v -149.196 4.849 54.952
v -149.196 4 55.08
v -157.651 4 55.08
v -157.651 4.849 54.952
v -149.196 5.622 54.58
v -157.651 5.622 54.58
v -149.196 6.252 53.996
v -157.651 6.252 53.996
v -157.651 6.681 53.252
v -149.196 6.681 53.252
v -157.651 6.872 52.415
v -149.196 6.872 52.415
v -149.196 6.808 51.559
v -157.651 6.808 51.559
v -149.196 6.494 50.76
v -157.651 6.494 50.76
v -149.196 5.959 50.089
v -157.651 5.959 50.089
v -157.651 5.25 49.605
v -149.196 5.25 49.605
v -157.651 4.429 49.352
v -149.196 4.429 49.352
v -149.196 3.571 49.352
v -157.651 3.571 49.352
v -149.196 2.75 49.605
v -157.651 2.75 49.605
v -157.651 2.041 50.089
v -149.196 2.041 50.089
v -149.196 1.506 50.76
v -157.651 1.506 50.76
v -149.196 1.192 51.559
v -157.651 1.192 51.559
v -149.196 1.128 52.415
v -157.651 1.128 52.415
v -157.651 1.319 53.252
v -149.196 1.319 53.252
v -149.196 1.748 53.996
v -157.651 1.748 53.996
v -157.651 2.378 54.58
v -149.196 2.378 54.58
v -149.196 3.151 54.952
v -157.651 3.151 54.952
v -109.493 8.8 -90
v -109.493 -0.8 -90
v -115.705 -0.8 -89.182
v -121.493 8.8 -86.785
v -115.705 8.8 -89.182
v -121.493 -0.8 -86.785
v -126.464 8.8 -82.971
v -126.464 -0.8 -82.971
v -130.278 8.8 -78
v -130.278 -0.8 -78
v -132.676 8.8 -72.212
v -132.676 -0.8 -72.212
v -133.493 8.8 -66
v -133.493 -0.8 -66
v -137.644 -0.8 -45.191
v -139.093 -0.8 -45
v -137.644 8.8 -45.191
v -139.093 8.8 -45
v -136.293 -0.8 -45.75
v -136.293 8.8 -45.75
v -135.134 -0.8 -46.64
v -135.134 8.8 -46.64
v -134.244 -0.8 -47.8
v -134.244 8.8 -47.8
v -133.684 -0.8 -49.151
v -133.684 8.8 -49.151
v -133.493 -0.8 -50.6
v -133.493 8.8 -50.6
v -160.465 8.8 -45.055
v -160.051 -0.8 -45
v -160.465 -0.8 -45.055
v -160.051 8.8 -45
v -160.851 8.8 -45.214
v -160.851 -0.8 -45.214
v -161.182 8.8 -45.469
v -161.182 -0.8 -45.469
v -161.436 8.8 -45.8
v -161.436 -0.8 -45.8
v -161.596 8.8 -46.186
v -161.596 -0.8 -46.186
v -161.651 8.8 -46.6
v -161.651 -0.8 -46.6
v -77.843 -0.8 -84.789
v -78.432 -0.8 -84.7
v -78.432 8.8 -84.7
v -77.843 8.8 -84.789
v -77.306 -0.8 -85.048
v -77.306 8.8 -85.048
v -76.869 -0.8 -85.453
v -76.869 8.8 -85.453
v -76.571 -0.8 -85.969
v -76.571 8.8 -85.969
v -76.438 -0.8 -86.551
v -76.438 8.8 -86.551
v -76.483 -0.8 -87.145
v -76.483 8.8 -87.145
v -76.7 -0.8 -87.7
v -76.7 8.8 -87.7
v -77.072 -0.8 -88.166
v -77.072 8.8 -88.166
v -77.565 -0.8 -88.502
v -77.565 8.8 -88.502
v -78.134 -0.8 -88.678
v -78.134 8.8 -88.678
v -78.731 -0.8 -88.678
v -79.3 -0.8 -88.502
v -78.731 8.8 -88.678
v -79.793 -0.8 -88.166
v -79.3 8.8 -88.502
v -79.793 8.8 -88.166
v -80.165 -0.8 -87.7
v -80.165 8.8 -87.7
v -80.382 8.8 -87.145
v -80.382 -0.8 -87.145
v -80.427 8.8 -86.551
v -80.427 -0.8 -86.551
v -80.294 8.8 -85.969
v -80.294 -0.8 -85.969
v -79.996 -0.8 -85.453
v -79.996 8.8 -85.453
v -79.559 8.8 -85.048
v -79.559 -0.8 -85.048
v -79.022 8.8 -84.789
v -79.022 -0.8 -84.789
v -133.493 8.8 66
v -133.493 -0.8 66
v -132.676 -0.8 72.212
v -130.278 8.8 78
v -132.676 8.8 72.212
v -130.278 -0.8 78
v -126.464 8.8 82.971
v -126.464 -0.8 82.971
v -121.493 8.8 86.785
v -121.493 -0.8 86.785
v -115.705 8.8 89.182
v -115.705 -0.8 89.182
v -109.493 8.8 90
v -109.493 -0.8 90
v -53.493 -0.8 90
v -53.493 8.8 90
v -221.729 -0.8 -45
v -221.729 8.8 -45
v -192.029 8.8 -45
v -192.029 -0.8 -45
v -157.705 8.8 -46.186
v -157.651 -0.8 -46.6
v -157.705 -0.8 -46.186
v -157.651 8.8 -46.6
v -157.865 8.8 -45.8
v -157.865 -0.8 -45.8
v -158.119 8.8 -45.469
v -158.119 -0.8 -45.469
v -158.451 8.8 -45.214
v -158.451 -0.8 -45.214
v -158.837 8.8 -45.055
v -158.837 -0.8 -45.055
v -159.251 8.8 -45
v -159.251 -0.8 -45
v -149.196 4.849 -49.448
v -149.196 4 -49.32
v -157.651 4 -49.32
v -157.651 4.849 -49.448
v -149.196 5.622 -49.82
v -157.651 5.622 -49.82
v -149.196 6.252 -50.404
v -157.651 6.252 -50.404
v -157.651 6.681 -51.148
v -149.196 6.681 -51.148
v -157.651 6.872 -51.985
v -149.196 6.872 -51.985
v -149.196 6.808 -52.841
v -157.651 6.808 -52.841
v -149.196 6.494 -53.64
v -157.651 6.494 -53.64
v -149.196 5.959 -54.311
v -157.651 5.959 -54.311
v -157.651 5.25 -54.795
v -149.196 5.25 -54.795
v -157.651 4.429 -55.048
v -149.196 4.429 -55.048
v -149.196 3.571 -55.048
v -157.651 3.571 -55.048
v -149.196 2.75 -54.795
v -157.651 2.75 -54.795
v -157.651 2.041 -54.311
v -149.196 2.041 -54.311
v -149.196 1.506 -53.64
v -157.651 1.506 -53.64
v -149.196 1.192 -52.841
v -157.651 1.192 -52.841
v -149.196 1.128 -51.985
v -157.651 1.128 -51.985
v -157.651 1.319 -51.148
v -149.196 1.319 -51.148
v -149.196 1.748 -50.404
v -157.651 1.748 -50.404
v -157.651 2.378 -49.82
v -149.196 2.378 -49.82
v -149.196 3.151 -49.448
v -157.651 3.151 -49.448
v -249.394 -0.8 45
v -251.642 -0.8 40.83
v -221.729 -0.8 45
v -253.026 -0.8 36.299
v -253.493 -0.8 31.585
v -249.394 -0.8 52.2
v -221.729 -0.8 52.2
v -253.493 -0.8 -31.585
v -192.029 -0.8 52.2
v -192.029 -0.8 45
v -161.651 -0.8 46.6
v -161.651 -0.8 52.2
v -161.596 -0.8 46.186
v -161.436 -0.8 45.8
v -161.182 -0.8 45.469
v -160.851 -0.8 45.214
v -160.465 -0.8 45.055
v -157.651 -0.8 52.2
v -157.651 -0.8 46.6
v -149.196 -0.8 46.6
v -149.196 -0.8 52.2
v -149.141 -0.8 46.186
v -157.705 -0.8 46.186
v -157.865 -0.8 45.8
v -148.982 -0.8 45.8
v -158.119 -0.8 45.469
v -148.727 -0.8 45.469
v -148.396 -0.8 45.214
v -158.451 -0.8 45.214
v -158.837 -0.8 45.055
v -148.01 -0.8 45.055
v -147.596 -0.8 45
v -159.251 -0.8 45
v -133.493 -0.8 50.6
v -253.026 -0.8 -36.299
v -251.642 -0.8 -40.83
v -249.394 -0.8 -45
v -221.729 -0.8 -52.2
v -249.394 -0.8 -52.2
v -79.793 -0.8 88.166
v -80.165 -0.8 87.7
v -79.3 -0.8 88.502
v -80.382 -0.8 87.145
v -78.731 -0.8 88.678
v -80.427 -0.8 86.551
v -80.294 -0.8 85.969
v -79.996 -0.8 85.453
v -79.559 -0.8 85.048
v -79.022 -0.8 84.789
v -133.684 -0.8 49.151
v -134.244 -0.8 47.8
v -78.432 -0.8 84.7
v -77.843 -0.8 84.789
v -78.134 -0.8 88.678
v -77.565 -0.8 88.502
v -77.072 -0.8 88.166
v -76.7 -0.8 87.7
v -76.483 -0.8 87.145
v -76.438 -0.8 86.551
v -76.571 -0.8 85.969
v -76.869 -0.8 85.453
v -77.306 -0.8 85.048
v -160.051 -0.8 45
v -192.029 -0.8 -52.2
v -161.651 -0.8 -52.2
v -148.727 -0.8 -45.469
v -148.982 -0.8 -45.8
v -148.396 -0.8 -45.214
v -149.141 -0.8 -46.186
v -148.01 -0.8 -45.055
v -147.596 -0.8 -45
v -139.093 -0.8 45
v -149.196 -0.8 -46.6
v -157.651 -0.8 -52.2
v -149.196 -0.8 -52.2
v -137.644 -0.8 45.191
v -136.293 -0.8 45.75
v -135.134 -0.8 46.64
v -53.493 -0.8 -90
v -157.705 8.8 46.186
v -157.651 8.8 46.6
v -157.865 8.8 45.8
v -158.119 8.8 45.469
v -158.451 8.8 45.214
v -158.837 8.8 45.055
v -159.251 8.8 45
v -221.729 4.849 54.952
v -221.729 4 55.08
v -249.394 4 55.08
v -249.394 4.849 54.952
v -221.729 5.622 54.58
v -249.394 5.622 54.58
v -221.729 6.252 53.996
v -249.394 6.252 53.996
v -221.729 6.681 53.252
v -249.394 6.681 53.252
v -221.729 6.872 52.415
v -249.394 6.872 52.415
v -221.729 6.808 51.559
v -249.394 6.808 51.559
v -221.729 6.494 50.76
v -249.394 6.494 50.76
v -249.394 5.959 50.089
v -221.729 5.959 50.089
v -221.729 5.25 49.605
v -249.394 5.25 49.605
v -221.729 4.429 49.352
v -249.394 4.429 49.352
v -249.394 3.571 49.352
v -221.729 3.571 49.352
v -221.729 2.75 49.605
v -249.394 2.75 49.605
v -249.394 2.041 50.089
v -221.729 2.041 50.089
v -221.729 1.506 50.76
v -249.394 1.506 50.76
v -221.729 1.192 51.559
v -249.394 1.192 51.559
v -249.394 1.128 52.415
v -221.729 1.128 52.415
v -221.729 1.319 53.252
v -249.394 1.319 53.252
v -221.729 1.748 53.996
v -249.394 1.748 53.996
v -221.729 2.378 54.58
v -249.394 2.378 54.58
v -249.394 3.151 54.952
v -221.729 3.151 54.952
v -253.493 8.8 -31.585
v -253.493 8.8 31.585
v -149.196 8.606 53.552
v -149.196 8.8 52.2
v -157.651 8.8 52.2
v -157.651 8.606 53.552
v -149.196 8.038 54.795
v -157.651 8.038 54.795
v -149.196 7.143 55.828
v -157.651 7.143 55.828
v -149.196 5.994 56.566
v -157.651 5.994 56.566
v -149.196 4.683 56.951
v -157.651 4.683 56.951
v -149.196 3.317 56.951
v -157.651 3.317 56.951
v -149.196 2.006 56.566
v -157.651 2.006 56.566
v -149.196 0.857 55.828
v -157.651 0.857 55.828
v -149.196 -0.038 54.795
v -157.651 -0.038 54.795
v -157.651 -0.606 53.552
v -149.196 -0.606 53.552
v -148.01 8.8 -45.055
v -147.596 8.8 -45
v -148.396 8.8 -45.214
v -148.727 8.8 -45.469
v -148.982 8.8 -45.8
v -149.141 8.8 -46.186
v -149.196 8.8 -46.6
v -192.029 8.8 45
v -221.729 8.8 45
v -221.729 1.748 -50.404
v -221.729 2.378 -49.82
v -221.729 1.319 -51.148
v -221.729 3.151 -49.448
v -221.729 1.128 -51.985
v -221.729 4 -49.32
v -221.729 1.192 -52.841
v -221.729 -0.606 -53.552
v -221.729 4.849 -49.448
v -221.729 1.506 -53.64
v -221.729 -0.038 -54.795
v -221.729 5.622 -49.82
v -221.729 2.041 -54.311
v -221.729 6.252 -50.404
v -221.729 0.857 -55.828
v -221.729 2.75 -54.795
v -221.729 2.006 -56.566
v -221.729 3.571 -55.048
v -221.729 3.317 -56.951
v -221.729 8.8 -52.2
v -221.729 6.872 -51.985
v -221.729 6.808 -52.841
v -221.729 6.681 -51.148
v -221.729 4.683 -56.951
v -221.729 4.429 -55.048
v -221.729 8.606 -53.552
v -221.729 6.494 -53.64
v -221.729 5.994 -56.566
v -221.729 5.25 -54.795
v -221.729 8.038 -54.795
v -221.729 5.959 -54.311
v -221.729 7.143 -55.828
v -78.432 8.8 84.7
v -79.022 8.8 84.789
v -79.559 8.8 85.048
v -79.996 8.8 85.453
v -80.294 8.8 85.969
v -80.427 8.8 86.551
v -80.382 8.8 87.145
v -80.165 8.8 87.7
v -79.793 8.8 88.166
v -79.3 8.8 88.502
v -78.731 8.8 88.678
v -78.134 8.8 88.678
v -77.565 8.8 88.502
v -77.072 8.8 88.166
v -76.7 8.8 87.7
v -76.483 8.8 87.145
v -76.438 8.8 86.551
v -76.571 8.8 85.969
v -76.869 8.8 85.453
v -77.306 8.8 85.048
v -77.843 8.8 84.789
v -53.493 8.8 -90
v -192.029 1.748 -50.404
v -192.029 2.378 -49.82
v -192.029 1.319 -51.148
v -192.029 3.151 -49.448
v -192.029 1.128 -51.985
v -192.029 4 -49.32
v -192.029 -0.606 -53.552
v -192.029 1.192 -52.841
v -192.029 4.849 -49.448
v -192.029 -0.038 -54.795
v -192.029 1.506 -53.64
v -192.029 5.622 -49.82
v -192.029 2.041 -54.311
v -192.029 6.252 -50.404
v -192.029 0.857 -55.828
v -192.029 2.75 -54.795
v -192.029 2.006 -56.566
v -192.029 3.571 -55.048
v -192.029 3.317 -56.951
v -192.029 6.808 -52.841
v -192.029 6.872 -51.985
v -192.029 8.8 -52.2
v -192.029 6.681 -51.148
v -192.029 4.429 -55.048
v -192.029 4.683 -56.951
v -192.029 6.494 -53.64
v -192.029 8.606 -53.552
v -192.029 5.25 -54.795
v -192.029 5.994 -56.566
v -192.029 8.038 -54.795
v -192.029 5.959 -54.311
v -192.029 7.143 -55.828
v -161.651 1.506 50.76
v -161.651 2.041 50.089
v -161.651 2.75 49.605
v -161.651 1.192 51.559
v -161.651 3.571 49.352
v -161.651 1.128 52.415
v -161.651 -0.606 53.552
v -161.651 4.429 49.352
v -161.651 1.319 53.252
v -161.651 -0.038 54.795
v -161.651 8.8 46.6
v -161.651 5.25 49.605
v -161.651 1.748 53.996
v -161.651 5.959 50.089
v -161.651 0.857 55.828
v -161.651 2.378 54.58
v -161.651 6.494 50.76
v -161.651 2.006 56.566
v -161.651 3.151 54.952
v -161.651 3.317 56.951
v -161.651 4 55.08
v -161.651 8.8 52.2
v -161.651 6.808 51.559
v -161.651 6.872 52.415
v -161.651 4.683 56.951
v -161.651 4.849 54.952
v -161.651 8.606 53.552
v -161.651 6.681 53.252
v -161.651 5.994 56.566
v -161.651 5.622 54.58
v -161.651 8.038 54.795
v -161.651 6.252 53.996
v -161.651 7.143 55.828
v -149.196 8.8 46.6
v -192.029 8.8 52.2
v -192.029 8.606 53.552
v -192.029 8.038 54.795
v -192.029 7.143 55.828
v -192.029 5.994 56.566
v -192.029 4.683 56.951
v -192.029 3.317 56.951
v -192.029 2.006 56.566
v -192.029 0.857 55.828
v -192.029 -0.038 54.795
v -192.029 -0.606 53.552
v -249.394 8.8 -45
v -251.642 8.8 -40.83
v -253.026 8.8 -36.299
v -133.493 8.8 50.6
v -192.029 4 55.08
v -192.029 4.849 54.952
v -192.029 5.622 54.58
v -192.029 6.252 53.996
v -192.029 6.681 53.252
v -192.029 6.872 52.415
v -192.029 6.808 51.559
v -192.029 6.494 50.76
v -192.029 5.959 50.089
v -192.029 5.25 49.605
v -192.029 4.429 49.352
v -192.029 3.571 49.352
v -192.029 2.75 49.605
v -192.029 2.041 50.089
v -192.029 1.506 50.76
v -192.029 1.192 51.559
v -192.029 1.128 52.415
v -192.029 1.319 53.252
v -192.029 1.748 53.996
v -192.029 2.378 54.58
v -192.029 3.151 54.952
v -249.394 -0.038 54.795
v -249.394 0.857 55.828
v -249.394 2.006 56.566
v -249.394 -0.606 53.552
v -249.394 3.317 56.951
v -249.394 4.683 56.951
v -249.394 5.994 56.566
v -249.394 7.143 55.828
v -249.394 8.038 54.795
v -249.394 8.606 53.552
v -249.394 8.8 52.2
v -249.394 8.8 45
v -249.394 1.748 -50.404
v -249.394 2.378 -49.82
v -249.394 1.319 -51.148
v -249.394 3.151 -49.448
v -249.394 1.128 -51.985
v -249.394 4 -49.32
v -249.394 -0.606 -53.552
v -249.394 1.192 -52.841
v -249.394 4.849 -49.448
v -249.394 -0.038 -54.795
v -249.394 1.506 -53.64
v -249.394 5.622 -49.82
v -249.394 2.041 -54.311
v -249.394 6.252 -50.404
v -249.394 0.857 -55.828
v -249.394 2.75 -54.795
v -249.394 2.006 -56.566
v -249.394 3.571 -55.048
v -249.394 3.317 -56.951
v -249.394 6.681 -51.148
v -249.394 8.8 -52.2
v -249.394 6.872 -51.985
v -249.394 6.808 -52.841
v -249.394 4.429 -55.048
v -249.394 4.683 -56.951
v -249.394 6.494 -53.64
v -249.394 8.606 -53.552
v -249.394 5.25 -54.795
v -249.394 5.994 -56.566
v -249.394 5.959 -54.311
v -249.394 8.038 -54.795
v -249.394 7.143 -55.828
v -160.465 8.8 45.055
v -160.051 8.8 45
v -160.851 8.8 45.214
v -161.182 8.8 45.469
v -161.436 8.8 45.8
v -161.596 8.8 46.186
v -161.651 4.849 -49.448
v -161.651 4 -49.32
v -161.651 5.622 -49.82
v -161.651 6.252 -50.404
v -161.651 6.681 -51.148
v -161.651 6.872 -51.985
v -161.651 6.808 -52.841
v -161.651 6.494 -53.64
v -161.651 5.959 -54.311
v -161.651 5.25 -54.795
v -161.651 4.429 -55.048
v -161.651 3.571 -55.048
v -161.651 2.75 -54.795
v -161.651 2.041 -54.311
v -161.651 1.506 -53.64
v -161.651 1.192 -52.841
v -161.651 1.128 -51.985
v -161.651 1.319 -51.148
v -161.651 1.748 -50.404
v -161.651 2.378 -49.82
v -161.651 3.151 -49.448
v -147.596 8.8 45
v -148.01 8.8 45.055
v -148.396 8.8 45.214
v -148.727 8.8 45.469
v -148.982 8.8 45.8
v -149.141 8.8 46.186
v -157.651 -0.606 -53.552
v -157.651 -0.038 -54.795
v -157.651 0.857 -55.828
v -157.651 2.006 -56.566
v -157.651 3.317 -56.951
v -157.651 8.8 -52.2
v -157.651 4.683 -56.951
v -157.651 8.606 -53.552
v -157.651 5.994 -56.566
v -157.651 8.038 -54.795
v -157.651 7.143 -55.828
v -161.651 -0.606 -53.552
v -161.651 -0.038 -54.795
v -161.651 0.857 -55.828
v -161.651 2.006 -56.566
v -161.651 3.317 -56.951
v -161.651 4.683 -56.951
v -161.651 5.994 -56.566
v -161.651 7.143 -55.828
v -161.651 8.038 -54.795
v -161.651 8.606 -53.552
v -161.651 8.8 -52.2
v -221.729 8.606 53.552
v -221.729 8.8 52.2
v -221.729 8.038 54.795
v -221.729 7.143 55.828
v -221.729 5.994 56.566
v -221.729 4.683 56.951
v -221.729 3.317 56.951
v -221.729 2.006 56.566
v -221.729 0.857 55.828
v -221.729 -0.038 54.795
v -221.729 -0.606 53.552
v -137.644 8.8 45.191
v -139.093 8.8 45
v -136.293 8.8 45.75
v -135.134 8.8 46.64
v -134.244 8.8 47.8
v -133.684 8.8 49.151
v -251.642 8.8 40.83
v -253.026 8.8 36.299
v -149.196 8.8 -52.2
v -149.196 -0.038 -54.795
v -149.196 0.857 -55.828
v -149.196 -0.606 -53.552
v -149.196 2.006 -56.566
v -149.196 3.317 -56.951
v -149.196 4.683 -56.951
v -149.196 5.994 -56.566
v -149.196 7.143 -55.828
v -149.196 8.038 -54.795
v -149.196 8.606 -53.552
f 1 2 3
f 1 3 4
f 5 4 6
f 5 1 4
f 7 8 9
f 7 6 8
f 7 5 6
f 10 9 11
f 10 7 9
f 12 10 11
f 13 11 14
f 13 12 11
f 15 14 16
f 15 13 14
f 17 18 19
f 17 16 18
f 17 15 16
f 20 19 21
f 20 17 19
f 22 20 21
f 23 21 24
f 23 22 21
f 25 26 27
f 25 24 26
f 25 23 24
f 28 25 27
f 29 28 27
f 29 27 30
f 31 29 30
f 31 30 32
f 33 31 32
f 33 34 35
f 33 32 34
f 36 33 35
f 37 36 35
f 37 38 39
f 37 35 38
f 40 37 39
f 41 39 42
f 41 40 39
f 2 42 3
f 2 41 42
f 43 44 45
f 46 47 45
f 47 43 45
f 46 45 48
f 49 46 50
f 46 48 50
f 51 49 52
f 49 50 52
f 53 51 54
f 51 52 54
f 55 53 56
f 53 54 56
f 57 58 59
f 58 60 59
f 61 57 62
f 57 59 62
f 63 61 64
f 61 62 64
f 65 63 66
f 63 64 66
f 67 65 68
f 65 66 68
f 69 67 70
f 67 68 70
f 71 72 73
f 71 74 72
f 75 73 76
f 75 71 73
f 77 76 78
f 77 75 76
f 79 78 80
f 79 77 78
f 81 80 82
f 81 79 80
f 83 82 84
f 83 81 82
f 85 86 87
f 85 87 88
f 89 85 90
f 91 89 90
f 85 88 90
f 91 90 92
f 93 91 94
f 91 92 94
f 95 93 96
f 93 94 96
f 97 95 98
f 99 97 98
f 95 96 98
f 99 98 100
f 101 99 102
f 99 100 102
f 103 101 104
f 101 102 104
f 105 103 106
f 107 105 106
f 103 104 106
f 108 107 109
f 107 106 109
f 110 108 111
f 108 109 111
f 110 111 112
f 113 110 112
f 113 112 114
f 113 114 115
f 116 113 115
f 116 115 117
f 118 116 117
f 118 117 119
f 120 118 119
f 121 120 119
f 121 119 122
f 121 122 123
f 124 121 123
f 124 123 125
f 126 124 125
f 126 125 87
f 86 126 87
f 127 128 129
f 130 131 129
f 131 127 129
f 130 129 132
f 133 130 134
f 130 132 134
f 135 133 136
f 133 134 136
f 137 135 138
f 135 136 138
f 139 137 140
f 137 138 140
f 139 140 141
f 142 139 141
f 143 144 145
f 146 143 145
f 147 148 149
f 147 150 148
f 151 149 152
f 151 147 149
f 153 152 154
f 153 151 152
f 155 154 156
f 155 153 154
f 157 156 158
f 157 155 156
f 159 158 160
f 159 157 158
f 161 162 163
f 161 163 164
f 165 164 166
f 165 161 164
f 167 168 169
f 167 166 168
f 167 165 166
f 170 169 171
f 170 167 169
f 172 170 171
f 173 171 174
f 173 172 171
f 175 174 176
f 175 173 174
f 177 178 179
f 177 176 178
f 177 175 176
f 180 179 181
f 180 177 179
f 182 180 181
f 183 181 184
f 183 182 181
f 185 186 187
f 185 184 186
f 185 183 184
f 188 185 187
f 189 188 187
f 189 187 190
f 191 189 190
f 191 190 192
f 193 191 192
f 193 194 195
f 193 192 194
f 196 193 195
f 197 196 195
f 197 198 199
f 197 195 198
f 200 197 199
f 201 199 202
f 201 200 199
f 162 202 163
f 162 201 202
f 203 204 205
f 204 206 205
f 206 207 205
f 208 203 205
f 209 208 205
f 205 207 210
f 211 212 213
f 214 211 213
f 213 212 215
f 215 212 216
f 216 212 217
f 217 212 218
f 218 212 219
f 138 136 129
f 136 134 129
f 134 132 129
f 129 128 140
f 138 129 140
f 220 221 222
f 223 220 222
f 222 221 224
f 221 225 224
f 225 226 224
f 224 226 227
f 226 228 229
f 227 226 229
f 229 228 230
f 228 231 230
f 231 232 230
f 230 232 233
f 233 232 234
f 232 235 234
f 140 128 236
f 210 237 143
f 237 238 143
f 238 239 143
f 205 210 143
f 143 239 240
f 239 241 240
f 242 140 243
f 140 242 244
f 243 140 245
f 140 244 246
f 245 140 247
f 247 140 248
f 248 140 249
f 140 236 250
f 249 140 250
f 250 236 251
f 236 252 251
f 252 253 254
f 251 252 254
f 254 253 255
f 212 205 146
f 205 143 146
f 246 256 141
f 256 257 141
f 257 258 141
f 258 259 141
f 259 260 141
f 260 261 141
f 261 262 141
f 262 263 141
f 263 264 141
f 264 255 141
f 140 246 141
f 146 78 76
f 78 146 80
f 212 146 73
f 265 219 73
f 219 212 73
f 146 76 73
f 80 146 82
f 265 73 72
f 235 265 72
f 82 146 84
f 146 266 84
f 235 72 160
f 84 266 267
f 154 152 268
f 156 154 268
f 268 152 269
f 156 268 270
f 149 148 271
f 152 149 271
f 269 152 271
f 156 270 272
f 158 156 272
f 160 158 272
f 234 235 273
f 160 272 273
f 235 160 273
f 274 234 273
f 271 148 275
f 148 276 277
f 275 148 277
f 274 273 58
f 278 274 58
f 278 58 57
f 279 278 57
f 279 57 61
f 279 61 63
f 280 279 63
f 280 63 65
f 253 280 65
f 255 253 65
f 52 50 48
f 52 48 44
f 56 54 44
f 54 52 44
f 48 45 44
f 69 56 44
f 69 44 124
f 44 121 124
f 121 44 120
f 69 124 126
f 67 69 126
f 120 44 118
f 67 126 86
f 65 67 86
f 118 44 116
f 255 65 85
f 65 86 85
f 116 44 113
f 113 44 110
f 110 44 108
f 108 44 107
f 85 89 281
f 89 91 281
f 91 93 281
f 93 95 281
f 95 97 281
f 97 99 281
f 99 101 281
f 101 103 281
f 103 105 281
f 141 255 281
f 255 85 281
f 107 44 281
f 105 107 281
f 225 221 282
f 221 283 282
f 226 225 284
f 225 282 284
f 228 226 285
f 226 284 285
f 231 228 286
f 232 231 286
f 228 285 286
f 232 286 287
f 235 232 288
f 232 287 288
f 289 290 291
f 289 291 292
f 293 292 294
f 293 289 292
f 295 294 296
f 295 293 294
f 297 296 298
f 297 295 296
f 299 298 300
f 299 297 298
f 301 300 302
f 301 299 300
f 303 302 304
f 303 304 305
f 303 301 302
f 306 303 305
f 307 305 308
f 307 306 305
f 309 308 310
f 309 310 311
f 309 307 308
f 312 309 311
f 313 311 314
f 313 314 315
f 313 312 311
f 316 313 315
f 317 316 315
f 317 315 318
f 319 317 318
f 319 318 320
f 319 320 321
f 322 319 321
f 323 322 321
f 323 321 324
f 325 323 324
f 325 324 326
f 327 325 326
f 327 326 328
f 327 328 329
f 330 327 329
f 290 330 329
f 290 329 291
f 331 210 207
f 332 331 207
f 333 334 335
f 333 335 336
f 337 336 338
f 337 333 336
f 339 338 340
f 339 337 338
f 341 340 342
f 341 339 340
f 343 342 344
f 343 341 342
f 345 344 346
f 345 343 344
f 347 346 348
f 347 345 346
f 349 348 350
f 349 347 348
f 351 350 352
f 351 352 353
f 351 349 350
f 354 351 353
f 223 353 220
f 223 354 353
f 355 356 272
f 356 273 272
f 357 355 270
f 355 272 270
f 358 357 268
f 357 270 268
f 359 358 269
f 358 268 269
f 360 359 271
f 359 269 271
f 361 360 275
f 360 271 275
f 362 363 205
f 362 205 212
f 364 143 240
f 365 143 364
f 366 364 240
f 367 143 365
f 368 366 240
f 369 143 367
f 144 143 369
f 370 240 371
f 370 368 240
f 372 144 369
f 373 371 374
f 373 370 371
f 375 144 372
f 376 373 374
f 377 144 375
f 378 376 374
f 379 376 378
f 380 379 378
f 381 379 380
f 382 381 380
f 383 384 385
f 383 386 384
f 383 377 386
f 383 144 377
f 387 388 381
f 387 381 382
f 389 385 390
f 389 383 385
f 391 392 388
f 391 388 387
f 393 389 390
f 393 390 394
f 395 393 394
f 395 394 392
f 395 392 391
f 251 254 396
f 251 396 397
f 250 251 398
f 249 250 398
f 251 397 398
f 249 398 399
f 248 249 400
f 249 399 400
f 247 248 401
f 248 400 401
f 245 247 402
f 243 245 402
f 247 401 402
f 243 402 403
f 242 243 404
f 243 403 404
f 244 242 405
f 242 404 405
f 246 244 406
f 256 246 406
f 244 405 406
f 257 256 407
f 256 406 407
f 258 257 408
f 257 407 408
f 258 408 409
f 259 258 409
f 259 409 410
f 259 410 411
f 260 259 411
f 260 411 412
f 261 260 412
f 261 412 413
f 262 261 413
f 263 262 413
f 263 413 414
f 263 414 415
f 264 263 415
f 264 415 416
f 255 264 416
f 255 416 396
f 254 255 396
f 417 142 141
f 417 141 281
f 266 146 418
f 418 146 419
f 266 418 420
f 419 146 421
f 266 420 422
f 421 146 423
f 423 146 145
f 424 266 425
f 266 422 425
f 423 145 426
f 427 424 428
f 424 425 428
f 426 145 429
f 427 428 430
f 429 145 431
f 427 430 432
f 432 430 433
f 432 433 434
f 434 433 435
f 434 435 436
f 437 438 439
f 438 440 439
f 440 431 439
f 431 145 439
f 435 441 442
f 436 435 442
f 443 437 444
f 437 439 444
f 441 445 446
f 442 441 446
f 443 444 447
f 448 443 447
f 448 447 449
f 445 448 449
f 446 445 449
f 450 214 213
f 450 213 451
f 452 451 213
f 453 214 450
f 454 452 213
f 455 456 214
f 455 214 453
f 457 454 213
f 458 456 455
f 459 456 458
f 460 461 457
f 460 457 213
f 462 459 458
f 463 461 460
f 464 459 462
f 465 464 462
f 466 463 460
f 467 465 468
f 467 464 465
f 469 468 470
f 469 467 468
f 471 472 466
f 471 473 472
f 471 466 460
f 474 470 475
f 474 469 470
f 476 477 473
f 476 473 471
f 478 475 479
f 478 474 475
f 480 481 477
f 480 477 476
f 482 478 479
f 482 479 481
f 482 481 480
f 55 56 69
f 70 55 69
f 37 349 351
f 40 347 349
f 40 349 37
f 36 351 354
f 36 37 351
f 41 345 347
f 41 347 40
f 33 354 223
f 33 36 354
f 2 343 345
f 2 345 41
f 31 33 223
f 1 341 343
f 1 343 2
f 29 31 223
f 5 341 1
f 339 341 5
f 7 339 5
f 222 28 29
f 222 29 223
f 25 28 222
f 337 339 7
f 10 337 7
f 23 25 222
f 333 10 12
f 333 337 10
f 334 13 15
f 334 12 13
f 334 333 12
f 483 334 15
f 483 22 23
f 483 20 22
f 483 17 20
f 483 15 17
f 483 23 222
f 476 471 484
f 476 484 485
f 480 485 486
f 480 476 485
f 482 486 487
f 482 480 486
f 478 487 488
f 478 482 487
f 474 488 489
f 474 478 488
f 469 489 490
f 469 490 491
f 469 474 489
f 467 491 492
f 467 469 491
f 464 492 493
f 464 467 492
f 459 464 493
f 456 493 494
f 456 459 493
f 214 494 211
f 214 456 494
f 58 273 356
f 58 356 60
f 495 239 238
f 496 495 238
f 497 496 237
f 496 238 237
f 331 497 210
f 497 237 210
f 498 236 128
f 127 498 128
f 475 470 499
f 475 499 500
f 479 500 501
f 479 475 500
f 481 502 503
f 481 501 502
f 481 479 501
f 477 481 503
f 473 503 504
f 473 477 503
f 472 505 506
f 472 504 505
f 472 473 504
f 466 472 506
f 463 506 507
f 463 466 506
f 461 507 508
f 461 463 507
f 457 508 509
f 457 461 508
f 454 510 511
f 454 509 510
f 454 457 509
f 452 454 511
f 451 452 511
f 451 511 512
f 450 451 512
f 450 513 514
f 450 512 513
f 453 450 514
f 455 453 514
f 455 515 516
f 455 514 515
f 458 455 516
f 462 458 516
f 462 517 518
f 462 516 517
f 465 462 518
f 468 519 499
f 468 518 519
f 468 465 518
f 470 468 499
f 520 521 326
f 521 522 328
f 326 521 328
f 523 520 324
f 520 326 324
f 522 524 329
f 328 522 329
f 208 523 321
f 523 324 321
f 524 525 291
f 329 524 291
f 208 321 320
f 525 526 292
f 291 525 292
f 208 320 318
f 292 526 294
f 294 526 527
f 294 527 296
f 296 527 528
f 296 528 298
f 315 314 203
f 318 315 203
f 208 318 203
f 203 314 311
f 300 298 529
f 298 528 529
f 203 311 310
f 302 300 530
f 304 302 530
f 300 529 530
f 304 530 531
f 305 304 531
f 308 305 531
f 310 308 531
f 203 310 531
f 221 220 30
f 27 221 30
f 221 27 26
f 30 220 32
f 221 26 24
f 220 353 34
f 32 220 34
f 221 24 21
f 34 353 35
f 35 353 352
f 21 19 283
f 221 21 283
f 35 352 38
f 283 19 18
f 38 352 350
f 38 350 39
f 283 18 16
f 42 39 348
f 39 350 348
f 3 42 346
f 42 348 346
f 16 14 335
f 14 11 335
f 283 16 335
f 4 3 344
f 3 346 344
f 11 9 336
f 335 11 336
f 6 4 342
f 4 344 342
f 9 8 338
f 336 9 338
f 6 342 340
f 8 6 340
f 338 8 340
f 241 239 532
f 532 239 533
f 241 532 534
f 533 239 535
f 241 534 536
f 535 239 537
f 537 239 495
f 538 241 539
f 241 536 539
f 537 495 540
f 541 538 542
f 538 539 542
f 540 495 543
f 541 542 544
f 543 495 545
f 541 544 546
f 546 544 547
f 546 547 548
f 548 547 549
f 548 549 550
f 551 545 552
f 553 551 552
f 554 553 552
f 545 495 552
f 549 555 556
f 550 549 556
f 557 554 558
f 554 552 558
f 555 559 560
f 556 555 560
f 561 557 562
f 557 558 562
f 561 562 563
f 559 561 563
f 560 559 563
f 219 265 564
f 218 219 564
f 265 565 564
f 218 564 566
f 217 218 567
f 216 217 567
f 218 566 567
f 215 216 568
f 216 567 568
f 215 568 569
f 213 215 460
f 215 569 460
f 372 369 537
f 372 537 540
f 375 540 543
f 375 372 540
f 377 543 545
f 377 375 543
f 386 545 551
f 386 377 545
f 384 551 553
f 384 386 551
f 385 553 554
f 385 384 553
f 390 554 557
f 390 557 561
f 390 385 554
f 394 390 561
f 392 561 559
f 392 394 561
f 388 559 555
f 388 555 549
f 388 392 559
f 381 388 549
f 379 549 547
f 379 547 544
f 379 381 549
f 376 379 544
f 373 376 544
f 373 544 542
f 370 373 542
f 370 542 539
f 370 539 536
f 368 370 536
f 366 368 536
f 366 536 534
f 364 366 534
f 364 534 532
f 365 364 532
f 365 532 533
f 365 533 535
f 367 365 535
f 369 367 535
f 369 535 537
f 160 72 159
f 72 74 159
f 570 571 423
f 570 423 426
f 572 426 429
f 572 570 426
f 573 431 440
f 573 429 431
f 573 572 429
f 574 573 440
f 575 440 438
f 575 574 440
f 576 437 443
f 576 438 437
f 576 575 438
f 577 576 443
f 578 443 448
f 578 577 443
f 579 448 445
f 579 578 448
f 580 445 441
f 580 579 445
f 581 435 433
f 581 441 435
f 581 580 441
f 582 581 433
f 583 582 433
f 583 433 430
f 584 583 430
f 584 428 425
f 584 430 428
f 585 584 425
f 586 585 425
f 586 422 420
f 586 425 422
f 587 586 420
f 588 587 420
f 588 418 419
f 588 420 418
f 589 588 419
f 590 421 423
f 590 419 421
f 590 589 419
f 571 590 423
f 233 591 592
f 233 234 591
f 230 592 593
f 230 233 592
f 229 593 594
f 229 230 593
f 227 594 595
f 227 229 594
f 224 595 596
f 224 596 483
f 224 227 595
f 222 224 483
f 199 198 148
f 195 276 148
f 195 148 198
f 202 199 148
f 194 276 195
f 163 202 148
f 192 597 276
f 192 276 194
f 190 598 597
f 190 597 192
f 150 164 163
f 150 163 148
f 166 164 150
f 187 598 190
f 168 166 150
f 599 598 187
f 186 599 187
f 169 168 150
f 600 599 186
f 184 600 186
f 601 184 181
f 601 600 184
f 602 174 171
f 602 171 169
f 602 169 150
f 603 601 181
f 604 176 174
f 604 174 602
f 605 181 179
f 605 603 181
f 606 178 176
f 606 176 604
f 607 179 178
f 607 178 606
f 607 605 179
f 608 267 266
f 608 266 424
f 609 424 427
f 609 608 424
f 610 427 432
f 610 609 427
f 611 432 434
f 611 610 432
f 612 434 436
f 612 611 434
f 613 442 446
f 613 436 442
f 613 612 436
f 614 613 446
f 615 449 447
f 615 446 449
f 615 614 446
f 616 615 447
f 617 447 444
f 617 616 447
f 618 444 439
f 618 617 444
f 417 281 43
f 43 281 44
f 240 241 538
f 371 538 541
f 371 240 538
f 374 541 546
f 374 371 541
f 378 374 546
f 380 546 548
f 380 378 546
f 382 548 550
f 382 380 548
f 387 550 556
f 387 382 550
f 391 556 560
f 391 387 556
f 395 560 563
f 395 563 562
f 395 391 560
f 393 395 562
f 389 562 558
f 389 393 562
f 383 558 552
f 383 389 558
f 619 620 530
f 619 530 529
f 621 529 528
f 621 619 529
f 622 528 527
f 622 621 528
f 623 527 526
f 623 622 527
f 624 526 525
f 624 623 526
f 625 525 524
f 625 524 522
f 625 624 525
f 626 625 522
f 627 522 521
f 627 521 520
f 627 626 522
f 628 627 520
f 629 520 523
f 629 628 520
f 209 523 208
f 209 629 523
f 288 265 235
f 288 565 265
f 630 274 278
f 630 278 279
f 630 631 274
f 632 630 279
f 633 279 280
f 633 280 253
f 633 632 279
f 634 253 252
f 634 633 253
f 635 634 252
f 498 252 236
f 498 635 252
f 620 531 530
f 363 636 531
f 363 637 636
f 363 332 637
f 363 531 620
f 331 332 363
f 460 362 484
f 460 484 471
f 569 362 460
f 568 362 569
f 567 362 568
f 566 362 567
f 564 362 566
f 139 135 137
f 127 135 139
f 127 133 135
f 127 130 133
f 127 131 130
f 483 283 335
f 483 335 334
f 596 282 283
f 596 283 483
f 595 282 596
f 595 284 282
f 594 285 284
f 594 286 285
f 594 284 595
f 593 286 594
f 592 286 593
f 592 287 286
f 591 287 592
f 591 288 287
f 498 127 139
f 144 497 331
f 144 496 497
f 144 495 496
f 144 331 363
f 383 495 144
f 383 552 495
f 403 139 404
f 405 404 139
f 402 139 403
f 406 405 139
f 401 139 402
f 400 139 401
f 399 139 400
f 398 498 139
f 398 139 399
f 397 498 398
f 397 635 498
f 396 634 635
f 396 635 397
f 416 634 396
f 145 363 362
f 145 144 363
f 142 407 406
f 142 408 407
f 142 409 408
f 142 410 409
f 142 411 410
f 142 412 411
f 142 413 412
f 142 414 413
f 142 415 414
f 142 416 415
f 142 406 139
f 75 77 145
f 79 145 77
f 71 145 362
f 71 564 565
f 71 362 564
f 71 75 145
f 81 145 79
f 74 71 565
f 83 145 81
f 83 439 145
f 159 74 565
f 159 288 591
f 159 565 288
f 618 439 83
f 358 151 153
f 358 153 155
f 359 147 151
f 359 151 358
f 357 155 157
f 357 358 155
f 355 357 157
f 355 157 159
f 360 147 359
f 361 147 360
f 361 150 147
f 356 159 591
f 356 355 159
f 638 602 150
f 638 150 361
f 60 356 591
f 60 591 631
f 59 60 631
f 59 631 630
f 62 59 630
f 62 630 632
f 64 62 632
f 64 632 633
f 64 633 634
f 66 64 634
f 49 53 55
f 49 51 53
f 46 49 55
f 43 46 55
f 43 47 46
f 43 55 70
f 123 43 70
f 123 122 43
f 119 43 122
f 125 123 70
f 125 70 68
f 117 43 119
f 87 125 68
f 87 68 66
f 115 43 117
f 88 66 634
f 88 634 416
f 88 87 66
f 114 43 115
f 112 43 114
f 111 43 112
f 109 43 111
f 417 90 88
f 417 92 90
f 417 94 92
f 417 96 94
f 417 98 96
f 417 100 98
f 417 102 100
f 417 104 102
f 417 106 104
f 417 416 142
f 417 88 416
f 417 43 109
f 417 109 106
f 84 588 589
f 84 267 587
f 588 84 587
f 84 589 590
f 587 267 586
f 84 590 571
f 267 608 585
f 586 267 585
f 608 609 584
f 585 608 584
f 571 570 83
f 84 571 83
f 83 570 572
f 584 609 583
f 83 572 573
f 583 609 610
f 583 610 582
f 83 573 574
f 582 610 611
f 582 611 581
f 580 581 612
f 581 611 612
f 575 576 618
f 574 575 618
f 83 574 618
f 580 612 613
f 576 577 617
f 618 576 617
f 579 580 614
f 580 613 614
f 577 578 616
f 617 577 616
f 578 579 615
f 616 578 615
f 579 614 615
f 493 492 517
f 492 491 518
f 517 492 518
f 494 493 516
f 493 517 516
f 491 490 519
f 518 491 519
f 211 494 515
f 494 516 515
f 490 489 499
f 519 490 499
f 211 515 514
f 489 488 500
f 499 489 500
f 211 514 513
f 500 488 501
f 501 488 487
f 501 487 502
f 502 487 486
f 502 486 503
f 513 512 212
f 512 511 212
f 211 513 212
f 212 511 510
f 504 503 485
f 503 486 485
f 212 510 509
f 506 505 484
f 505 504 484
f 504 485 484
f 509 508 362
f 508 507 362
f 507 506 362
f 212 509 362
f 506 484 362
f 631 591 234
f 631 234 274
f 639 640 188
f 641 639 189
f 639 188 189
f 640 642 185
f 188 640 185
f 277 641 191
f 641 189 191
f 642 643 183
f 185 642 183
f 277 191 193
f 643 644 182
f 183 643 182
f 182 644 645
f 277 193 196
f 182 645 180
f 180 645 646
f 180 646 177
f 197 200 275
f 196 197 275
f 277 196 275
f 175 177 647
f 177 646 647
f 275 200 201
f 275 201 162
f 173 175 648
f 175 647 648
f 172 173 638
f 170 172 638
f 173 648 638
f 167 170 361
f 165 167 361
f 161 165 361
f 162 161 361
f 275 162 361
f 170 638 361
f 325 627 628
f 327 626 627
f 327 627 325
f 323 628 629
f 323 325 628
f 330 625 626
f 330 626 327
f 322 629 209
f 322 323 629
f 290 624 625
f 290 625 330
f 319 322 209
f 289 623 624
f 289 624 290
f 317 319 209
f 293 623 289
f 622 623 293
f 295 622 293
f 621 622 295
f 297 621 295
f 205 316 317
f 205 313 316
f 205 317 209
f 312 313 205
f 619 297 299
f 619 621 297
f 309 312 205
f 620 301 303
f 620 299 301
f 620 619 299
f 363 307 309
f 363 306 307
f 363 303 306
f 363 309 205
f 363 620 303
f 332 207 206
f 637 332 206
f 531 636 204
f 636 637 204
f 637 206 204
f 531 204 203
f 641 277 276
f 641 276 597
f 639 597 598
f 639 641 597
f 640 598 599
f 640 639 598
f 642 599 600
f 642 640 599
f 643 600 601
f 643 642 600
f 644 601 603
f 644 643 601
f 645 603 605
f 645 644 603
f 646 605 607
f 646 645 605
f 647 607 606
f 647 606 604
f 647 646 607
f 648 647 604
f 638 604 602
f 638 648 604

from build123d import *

# Parameters (mm, degrees)
BOSS_EXTRUDE1_DEPTH      = 8
BOSS_EXTRUDE2_DEPTH      = 46.583974855
BOSS_EXTRUDE2_DEPTH_BACK = 46.58397486
SKETCH4_R                = 2.4
SKETCH6_W                = 20
SKETCH6_H                = 3
BOSS_EXTRUDE3_DEPTH      = 30
CUT_EXTRUDE2_DEPTH       = 233.497849452
CUT_EXTRUDE2_DEPTH_BACK  = 233.497849452
SKETCH7_R                = 2
SKETCH8_W                = 40
SKETCH8_H                = 3
CUT_EXTRUDE3_DEPTH       = 40
SKETCH9_R                = 2
CUT_EXTRUDE4_DEPTH       = 40
FILLET1_R                = 20
SKETCH17_R               = 1.5
CUT_EXTRUDE10_DEPTH      = 25
SCALE1_SCALE             = 1.5
SKETCH18_W               = 192.636116151
SKETCH18_H               = 297.519421562
CUT_EXTRUDE11_DEPTH      = 304.953519557
SKETCH19_W               = 5
SKETCH19_H               = 12
CUT_EXTRUDE12_DEPTH      = 56.25
SKETCH20_W               = 35
SKETCH20_H               = 20.748828486
SKETCH20_W_2             = 15.531607356
SKETCH20_H_2             = 16.854299174
CUT_EXTRUDE13_DEPTH      = 304.953519557
FILLET2_R                = 2
FILLET3_R                = 7
FILLET4_R                = 2
SCALE2_SCALE             = 0.8
SKETCH21_R               = 1.8
BOSS_EXTRUDE4_DEPTH      = 9.6
SKETCH22_R               = 2
CUT_EXTRUDE14_DEPTH      = 270.167443306
SKETCH23_W               = 3.17304631
SKETCH23_H               = 12
SKETCH23_W_2             = 2.864071414
CUT_EXTRUDE15_DEPTH      = 270.167443306
SKETCH25_W               = 3.467321183
SKETCH25_H               = 12
CUT_EXTRUDE17_DEPTH      = 270.167443306


with BuildPart() as part:
    # Sketch1 → Boss-Extrude1 (new body)
    with BuildSketch(Plane(origin=(0, 0, 0), x_dir=(1, 0, 0), z_dir=(0, 1, 0))):
        Polygon((-120, -37.5), (-120, -75), (0, -75), (0, 75), (-120, 75), (-120, 37.5), (-220, 37.5), (-220, -37.5), align=None)
    extrude(amount=BOSS_EXTRUDE1_DEPTH)

    # Sketch4 → Boss-Extrude2 (add, two sides: drawn at the far end of the back side and taken through both)
    # profile 1 of 2: a face of its own
    with BuildSketch(Plane.ZY.offset(170).offset(-BOSS_EXTRUDE2_DEPTH_BACK)):
        with BuildLine():
            Line((37.5, 8), (43.5, 8))
            ThreePointArc((43.5, 8), (47.5, 4), (43.5, 0))
            Line((43.5, 0), (37.5, 0))
            Line((37.5, 0), (37.5, 8))
        make_face()
        with Locations((43.5, 4)):
            Circle(SKETCH4_R, mode=Mode.SUBTRACT)
    # profile 2 of 2: a face of its own
    with BuildSketch(Plane.ZY.offset(170).offset(-BOSS_EXTRUDE2_DEPTH_BACK)):
        with BuildLine():
            Line((-37.5, 0), (-43.5, 0))
            ThreePointArc((-43.5, 0), (-47.5, 4), (-43.5, 8))
            Line((-43.5, 8), (-37.5, 8))
            Line((-37.5, 8), (-37.5, 0))
        make_face()
        with Locations((-43.5, 4)):
            Circle(SKETCH4_R, mode=Mode.SUBTRACT)
    extrude(amount=BOSS_EXTRUDE2_DEPTH + BOSS_EXTRUDE2_DEPTH_BACK)

    # Sketch6 → Boss-Extrude3 (add)
    with BuildSketch(Plane(origin=(0, 0, 0), x_dir=(0, 0, -1), z_dir=(1, 0, 0))):
        with Locations((-50, 4)):
            Rectangle(SKETCH6_W, SKETCH6_H)
        with Locations((50, 4)):
            Rectangle(SKETCH6_W, SKETCH6_H)
    extrude(amount=BOSS_EXTRUDE3_DEPTH)

    # Sketch7 → Cut-Extrude2 (cut, two sides: drawn at the far end of the back side and taken through both)
    with BuildSketch(Plane(origin=(0, 5.5, 0), x_dir=(1, 0, 0), z_dir=(0, 1, 0)).offset(-CUT_EXTRUDE2_DEPTH_BACK)):
        with Locations(Location((22.5, 50, 0), (0, 0, 270))):
            Circle(SKETCH7_R)
        with Locations(Location((22.5, -50, 0), (0, 0, 270))):
            Circle(SKETCH7_R)
    extrude(amount=CUT_EXTRUDE2_DEPTH + CUT_EXTRUDE2_DEPTH_BACK, mode=Mode.SUBTRACT)

    # Sketch8 → Cut-Extrude3 (cut)
    with BuildSketch(Plane(origin=(0, 0, 0), x_dir=(0, 0, -1), z_dir=(1, 0, 0))):
        with Locations((0, 4)):
            Rectangle(SKETCH8_W, SKETCH8_H)
    extrude(amount=-CUT_EXTRUDE3_DEPTH, mode=Mode.SUBTRACT)

    # Sketch9 → Cut-Extrude4 (cut)
    with BuildSketch(Plane(origin=(0, 8, 0), x_dir=(1, 0, 0), z_dir=(0, 1, 0))):
        with Locations(Location((-32.5, 0, 0), (0, 0, 270))):
            Circle(SKETCH9_R)
    extrude(amount=-CUT_EXTRUDE4_DEPTH, mode=Mode.SUBTRACT)

    # Fillet1
    # the kernel refuses this fillet: 20 mm, written as the material it takes off along each edge
    with BuildSketch(Plane(origin=(-220, -27.947694226, -37.5), x_dir=(0, 0, 1), z_dir=(0, 1, 0))) as fillet1_piece_1:
        with BuildLine():
            CenterArc((11.17907769, 20), FILLET1_R, 236.01651728, 33.98348272)
            Line((0, 3.416025145), (-0.223581554, 3.084345648))
            ThreePointArc((-0.223581554, 3.084345648), (-0.4, 1.708012572), (-0.4, 0))
            Line((-0.4, 0), (0, -0.4))
            Line((0, -0.4), (11.17907769, -0.4))
            Line((11.17907769, -0.4), (11.17907769, 0))
        make_face()
    extrude(amount=63.895388452, mode=Mode.SUBTRACT)
    with BuildSketch(Plane(origin=(-220, -27.947694226, 37.5), x_dir=(1, 0, 0), z_dir=(0, 1, 0))) as fillet1_piece_2:
        with BuildLine():
            CenterArc((20, 11.17907769), FILLET1_R, 180, 33.98348272)
            Line((0, 11.17907769), (-0.4, 11.17907769))
            Line((-0.4, 11.17907769), (-0.4, 0))
            Line((-0.4, 0), (0, -0.4))
            ThreePointArc((0, -0.4), (1.708012572, -0.4), (3.084345648, -0.223581554))
            Line((3.084345648, -0.223581554), (3.416025145, 0))
        make_face()
    extrude(amount=63.895388452, mode=Mode.SUBTRACT)
    with BuildSketch(Plane(origin=(-120, -50, -75), x_dir=(1, 0, 0), z_dir=(0, 1, 0)), Plane(origin=(-120, -50, 75), x_dir=(0, 0, -1), z_dir=(0, 1, 0))) as fillet1_piece_3:
        with BuildLine():
            CenterArc((FILLET1_R, -FILLET1_R), FILLET1_R, 90, 90)
            Line((0, -FILLET1_R), (-FILLET1_R * 0.02, -FILLET1_R))
            Line((-FILLET1_R * 0.02, -FILLET1_R), (-FILLET1_R * 0.02, FILLET1_R * 0.02))
            Line((-FILLET1_R * 0.02, FILLET1_R * 0.02), (FILLET1_R, FILLET1_R * 0.02))
            Line((FILLET1_R, FILLET1_R * 0.02), (FILLET1_R, 0))
        make_face()
    extrude(amount=108, mode=Mode.SUBTRACT)

    # Sketch17 → Cut-Extrude10 (cut)
    with BuildSketch(Plane(origin=(0, 8, 0), x_dir=(1, 0, 0), z_dir=(0, 1, 0))):
        with Locations(Location((-75, 72.25, 0), (0, 0, 270))):
            Circle(SKETCH17_R)
        with Locations(Location((-25, 72.25, 0), (0, 0, 270))):
            Circle(SKETCH17_R)
        with Locations(Location((-25, -72.25, 0), (0, 0, 270))):
            Circle(SKETCH17_R)
        with Locations(Location((-75, -72.25, 0), (0, 0, 270))):
            Circle(SKETCH17_R)
    extrude(amount=-CUT_EXTRUDE10_DEPTH, mode=Mode.SUBTRACT)


with BuildPart() as part_1:
    # Scale1: scaled about (-95.774895805, 4, 0)
    add(part.part.scale(SCALE1_SCALE).moved(Location((47.887447902, -2, 0))))

    # Sketch18 → Cut-Extrude11 (cut, through all)
    with BuildSketch(Plane(origin=(0, 10, 0), x_dir=(1, 0, 0), z_dir=(0, 1, 0))):
        with Locations((64.205505977, 3.096142809)):
            Rectangle(SKETCH18_W, SKETCH18_H)
    extrude(amount=-CUT_EXTRUDE11_DEPTH, mode=Mode.SUBTRACT)

    # Sketch19 → Cut-Extrude12 (cut)
    with BuildSketch(Plane.XY.offset(112.5)):
        with Locations((-164.809163738, 4)):
            Rectangle(SKETCH19_W, SKETCH19_H)
    cut_extrude12 = extrude(amount=-CUT_EXTRUDE12_DEPTH, mode=Mode.SUBTRACT)

    # Mirror2: Cut-Extrude12 across plane
    add(cut_extrude12.mirror(Plane.XY), mode=Mode.SUBTRACT)

    # Sketch20 → Cut-Extrude13 (cut, through all)
    with BuildSketch(Plane(origin=(0, 10, 0), x_dir=(1, 0, 0), z_dir=(0, 1, 0))):
        with Locations((-223.406777288, -66.624414243)):
            Rectangle(SKETCH20_W, SKETCH20_H)
        with Locations((-143.974864216, -64.677149587)):
            Rectangle(SKETCH20_W_2, SKETCH20_H_2)
    cut_extrude13 = extrude(amount=-CUT_EXTRUDE13_DEPTH, mode=Mode.SUBTRACT)

    # Fillet2
    fillet2_edges = [part_1.edges().sort_by_distance(p)[0] for p in [
        (-162.309163738, 4, 56.25),
        (-167.309163738, 4, 56.25),
        (-205.906777288, 4, 56.25),
        (-240.906777288, 4, 56.25),
        (-151.740667894, 4, 56.25),
    ]]
    fillet(fillet2_edges, radius=FILLET2_R)

    # Mirror3: Cut-Extrude13 across plane
    add(cut_extrude13.mirror(Plane.XY), mode=Mode.SUBTRACT)

    # Fillet3
    fillet3_edges = [part_1.edges().sort_by_distance(p)[0] for p in [
        (-132.112552097, 4, 56.25),
        (-132.112552097, 4, -56.25),
    ]]
    fillet(fillet3_edges, radius=FILLET3_R)

    # Fillet4
    fillet4_edges = [part_1.edges().sort_by_distance(p)[0] for p in [
        (-162.309163738, 4, -56.25),
        (-167.309163738, 4, -56.25),
        (-240.906777288, 4, -56.25),
        (-205.906777288, 4, -56.25),
        (-151.740667894, 4, -56.25),
    ]]
    fillet(fillet4_edges, radius=FILLET4_R)


with BuildPart() as part_2:
    # Scale2: scaled about (-139.017271823, 4, 0)
    add(part_1.part.scale(SCALE2_SCALE).moved(Location((-27.803454365, 0.8, 0))))

    # Sketch21 → Boss-Extrude4 (add)
    with BuildSketch(Plane(origin=(0, 8.8, 0), x_dir=(1, 0, 0), z_dir=(0, 1, 0))):
        with Locations((-79.493496043, 86.7)):
            Circle(SKETCH21_R)
        with Locations((-79.493496043, -86.7)):
            Circle(SKETCH21_R)
    extrude(amount=-BOSS_EXTRUDE4_DEPTH)

    # Sketch22 → Cut-Extrude14 (cut, through all)
    with BuildSketch(Plane(origin=(0, 8.8, 0), x_dir=(1, 0, 0), z_dir=(0, 1, 0))):
        with Locations(Location((-78.432456753, 86.7, 0), (0, 0, 270))):
            Circle(SKETCH22_R)
        with Locations(Location((-78.432456753, -86.7, 0), (0, 0, 90))):
            Circle(SKETCH22_R)
    extrude(amount=-CUT_EXTRUDE14_DEPTH, mode=Mode.SUBTRACT)

    # Sketch23 → Cut-Extrude15 (cut, through all)
    with BuildSketch(Plane(origin=(0, 8.8, 0), x_dir=(1, 0, 0), z_dir=(0, 1, 0))):
        with Locations((-219.44235304, 51)):
            Rectangle(SKETCH23_W, SKETCH23_H)
        with Locations((-219.44235304, -51)):
            Rectangle(SKETCH23_W, SKETCH23_H)
        with Locations((-193.460911902, 51)):
            Rectangle(SKETCH23_W_2, SKETCH23_H)
        with Locations((-193.460911902, -51)):
            Rectangle(SKETCH23_W_2, SKETCH23_H)
    extrude(amount=-CUT_EXTRUDE15_DEPTH, mode=Mode.SUBTRACT)

    # Sketch25 → Cut-Extrude17 (cut, through all)
    with BuildSketch(Plane(origin=(0, 8.8, 0), x_dir=(1, 0, 0), z_dir=(0, 1, 0))):
        with Locations((-219.995215604, -51)):
            Rectangle(SKETCH25_W, SKETCH25_H)
        with Locations((-219.995215604, 51)):
            Rectangle(SKETCH25_W, SKETCH25_H)
    extrude(amount=-CUT_EXTRUDE17_DEPTH, mode=Mode.SUBTRACT)


solid = part_2.part
